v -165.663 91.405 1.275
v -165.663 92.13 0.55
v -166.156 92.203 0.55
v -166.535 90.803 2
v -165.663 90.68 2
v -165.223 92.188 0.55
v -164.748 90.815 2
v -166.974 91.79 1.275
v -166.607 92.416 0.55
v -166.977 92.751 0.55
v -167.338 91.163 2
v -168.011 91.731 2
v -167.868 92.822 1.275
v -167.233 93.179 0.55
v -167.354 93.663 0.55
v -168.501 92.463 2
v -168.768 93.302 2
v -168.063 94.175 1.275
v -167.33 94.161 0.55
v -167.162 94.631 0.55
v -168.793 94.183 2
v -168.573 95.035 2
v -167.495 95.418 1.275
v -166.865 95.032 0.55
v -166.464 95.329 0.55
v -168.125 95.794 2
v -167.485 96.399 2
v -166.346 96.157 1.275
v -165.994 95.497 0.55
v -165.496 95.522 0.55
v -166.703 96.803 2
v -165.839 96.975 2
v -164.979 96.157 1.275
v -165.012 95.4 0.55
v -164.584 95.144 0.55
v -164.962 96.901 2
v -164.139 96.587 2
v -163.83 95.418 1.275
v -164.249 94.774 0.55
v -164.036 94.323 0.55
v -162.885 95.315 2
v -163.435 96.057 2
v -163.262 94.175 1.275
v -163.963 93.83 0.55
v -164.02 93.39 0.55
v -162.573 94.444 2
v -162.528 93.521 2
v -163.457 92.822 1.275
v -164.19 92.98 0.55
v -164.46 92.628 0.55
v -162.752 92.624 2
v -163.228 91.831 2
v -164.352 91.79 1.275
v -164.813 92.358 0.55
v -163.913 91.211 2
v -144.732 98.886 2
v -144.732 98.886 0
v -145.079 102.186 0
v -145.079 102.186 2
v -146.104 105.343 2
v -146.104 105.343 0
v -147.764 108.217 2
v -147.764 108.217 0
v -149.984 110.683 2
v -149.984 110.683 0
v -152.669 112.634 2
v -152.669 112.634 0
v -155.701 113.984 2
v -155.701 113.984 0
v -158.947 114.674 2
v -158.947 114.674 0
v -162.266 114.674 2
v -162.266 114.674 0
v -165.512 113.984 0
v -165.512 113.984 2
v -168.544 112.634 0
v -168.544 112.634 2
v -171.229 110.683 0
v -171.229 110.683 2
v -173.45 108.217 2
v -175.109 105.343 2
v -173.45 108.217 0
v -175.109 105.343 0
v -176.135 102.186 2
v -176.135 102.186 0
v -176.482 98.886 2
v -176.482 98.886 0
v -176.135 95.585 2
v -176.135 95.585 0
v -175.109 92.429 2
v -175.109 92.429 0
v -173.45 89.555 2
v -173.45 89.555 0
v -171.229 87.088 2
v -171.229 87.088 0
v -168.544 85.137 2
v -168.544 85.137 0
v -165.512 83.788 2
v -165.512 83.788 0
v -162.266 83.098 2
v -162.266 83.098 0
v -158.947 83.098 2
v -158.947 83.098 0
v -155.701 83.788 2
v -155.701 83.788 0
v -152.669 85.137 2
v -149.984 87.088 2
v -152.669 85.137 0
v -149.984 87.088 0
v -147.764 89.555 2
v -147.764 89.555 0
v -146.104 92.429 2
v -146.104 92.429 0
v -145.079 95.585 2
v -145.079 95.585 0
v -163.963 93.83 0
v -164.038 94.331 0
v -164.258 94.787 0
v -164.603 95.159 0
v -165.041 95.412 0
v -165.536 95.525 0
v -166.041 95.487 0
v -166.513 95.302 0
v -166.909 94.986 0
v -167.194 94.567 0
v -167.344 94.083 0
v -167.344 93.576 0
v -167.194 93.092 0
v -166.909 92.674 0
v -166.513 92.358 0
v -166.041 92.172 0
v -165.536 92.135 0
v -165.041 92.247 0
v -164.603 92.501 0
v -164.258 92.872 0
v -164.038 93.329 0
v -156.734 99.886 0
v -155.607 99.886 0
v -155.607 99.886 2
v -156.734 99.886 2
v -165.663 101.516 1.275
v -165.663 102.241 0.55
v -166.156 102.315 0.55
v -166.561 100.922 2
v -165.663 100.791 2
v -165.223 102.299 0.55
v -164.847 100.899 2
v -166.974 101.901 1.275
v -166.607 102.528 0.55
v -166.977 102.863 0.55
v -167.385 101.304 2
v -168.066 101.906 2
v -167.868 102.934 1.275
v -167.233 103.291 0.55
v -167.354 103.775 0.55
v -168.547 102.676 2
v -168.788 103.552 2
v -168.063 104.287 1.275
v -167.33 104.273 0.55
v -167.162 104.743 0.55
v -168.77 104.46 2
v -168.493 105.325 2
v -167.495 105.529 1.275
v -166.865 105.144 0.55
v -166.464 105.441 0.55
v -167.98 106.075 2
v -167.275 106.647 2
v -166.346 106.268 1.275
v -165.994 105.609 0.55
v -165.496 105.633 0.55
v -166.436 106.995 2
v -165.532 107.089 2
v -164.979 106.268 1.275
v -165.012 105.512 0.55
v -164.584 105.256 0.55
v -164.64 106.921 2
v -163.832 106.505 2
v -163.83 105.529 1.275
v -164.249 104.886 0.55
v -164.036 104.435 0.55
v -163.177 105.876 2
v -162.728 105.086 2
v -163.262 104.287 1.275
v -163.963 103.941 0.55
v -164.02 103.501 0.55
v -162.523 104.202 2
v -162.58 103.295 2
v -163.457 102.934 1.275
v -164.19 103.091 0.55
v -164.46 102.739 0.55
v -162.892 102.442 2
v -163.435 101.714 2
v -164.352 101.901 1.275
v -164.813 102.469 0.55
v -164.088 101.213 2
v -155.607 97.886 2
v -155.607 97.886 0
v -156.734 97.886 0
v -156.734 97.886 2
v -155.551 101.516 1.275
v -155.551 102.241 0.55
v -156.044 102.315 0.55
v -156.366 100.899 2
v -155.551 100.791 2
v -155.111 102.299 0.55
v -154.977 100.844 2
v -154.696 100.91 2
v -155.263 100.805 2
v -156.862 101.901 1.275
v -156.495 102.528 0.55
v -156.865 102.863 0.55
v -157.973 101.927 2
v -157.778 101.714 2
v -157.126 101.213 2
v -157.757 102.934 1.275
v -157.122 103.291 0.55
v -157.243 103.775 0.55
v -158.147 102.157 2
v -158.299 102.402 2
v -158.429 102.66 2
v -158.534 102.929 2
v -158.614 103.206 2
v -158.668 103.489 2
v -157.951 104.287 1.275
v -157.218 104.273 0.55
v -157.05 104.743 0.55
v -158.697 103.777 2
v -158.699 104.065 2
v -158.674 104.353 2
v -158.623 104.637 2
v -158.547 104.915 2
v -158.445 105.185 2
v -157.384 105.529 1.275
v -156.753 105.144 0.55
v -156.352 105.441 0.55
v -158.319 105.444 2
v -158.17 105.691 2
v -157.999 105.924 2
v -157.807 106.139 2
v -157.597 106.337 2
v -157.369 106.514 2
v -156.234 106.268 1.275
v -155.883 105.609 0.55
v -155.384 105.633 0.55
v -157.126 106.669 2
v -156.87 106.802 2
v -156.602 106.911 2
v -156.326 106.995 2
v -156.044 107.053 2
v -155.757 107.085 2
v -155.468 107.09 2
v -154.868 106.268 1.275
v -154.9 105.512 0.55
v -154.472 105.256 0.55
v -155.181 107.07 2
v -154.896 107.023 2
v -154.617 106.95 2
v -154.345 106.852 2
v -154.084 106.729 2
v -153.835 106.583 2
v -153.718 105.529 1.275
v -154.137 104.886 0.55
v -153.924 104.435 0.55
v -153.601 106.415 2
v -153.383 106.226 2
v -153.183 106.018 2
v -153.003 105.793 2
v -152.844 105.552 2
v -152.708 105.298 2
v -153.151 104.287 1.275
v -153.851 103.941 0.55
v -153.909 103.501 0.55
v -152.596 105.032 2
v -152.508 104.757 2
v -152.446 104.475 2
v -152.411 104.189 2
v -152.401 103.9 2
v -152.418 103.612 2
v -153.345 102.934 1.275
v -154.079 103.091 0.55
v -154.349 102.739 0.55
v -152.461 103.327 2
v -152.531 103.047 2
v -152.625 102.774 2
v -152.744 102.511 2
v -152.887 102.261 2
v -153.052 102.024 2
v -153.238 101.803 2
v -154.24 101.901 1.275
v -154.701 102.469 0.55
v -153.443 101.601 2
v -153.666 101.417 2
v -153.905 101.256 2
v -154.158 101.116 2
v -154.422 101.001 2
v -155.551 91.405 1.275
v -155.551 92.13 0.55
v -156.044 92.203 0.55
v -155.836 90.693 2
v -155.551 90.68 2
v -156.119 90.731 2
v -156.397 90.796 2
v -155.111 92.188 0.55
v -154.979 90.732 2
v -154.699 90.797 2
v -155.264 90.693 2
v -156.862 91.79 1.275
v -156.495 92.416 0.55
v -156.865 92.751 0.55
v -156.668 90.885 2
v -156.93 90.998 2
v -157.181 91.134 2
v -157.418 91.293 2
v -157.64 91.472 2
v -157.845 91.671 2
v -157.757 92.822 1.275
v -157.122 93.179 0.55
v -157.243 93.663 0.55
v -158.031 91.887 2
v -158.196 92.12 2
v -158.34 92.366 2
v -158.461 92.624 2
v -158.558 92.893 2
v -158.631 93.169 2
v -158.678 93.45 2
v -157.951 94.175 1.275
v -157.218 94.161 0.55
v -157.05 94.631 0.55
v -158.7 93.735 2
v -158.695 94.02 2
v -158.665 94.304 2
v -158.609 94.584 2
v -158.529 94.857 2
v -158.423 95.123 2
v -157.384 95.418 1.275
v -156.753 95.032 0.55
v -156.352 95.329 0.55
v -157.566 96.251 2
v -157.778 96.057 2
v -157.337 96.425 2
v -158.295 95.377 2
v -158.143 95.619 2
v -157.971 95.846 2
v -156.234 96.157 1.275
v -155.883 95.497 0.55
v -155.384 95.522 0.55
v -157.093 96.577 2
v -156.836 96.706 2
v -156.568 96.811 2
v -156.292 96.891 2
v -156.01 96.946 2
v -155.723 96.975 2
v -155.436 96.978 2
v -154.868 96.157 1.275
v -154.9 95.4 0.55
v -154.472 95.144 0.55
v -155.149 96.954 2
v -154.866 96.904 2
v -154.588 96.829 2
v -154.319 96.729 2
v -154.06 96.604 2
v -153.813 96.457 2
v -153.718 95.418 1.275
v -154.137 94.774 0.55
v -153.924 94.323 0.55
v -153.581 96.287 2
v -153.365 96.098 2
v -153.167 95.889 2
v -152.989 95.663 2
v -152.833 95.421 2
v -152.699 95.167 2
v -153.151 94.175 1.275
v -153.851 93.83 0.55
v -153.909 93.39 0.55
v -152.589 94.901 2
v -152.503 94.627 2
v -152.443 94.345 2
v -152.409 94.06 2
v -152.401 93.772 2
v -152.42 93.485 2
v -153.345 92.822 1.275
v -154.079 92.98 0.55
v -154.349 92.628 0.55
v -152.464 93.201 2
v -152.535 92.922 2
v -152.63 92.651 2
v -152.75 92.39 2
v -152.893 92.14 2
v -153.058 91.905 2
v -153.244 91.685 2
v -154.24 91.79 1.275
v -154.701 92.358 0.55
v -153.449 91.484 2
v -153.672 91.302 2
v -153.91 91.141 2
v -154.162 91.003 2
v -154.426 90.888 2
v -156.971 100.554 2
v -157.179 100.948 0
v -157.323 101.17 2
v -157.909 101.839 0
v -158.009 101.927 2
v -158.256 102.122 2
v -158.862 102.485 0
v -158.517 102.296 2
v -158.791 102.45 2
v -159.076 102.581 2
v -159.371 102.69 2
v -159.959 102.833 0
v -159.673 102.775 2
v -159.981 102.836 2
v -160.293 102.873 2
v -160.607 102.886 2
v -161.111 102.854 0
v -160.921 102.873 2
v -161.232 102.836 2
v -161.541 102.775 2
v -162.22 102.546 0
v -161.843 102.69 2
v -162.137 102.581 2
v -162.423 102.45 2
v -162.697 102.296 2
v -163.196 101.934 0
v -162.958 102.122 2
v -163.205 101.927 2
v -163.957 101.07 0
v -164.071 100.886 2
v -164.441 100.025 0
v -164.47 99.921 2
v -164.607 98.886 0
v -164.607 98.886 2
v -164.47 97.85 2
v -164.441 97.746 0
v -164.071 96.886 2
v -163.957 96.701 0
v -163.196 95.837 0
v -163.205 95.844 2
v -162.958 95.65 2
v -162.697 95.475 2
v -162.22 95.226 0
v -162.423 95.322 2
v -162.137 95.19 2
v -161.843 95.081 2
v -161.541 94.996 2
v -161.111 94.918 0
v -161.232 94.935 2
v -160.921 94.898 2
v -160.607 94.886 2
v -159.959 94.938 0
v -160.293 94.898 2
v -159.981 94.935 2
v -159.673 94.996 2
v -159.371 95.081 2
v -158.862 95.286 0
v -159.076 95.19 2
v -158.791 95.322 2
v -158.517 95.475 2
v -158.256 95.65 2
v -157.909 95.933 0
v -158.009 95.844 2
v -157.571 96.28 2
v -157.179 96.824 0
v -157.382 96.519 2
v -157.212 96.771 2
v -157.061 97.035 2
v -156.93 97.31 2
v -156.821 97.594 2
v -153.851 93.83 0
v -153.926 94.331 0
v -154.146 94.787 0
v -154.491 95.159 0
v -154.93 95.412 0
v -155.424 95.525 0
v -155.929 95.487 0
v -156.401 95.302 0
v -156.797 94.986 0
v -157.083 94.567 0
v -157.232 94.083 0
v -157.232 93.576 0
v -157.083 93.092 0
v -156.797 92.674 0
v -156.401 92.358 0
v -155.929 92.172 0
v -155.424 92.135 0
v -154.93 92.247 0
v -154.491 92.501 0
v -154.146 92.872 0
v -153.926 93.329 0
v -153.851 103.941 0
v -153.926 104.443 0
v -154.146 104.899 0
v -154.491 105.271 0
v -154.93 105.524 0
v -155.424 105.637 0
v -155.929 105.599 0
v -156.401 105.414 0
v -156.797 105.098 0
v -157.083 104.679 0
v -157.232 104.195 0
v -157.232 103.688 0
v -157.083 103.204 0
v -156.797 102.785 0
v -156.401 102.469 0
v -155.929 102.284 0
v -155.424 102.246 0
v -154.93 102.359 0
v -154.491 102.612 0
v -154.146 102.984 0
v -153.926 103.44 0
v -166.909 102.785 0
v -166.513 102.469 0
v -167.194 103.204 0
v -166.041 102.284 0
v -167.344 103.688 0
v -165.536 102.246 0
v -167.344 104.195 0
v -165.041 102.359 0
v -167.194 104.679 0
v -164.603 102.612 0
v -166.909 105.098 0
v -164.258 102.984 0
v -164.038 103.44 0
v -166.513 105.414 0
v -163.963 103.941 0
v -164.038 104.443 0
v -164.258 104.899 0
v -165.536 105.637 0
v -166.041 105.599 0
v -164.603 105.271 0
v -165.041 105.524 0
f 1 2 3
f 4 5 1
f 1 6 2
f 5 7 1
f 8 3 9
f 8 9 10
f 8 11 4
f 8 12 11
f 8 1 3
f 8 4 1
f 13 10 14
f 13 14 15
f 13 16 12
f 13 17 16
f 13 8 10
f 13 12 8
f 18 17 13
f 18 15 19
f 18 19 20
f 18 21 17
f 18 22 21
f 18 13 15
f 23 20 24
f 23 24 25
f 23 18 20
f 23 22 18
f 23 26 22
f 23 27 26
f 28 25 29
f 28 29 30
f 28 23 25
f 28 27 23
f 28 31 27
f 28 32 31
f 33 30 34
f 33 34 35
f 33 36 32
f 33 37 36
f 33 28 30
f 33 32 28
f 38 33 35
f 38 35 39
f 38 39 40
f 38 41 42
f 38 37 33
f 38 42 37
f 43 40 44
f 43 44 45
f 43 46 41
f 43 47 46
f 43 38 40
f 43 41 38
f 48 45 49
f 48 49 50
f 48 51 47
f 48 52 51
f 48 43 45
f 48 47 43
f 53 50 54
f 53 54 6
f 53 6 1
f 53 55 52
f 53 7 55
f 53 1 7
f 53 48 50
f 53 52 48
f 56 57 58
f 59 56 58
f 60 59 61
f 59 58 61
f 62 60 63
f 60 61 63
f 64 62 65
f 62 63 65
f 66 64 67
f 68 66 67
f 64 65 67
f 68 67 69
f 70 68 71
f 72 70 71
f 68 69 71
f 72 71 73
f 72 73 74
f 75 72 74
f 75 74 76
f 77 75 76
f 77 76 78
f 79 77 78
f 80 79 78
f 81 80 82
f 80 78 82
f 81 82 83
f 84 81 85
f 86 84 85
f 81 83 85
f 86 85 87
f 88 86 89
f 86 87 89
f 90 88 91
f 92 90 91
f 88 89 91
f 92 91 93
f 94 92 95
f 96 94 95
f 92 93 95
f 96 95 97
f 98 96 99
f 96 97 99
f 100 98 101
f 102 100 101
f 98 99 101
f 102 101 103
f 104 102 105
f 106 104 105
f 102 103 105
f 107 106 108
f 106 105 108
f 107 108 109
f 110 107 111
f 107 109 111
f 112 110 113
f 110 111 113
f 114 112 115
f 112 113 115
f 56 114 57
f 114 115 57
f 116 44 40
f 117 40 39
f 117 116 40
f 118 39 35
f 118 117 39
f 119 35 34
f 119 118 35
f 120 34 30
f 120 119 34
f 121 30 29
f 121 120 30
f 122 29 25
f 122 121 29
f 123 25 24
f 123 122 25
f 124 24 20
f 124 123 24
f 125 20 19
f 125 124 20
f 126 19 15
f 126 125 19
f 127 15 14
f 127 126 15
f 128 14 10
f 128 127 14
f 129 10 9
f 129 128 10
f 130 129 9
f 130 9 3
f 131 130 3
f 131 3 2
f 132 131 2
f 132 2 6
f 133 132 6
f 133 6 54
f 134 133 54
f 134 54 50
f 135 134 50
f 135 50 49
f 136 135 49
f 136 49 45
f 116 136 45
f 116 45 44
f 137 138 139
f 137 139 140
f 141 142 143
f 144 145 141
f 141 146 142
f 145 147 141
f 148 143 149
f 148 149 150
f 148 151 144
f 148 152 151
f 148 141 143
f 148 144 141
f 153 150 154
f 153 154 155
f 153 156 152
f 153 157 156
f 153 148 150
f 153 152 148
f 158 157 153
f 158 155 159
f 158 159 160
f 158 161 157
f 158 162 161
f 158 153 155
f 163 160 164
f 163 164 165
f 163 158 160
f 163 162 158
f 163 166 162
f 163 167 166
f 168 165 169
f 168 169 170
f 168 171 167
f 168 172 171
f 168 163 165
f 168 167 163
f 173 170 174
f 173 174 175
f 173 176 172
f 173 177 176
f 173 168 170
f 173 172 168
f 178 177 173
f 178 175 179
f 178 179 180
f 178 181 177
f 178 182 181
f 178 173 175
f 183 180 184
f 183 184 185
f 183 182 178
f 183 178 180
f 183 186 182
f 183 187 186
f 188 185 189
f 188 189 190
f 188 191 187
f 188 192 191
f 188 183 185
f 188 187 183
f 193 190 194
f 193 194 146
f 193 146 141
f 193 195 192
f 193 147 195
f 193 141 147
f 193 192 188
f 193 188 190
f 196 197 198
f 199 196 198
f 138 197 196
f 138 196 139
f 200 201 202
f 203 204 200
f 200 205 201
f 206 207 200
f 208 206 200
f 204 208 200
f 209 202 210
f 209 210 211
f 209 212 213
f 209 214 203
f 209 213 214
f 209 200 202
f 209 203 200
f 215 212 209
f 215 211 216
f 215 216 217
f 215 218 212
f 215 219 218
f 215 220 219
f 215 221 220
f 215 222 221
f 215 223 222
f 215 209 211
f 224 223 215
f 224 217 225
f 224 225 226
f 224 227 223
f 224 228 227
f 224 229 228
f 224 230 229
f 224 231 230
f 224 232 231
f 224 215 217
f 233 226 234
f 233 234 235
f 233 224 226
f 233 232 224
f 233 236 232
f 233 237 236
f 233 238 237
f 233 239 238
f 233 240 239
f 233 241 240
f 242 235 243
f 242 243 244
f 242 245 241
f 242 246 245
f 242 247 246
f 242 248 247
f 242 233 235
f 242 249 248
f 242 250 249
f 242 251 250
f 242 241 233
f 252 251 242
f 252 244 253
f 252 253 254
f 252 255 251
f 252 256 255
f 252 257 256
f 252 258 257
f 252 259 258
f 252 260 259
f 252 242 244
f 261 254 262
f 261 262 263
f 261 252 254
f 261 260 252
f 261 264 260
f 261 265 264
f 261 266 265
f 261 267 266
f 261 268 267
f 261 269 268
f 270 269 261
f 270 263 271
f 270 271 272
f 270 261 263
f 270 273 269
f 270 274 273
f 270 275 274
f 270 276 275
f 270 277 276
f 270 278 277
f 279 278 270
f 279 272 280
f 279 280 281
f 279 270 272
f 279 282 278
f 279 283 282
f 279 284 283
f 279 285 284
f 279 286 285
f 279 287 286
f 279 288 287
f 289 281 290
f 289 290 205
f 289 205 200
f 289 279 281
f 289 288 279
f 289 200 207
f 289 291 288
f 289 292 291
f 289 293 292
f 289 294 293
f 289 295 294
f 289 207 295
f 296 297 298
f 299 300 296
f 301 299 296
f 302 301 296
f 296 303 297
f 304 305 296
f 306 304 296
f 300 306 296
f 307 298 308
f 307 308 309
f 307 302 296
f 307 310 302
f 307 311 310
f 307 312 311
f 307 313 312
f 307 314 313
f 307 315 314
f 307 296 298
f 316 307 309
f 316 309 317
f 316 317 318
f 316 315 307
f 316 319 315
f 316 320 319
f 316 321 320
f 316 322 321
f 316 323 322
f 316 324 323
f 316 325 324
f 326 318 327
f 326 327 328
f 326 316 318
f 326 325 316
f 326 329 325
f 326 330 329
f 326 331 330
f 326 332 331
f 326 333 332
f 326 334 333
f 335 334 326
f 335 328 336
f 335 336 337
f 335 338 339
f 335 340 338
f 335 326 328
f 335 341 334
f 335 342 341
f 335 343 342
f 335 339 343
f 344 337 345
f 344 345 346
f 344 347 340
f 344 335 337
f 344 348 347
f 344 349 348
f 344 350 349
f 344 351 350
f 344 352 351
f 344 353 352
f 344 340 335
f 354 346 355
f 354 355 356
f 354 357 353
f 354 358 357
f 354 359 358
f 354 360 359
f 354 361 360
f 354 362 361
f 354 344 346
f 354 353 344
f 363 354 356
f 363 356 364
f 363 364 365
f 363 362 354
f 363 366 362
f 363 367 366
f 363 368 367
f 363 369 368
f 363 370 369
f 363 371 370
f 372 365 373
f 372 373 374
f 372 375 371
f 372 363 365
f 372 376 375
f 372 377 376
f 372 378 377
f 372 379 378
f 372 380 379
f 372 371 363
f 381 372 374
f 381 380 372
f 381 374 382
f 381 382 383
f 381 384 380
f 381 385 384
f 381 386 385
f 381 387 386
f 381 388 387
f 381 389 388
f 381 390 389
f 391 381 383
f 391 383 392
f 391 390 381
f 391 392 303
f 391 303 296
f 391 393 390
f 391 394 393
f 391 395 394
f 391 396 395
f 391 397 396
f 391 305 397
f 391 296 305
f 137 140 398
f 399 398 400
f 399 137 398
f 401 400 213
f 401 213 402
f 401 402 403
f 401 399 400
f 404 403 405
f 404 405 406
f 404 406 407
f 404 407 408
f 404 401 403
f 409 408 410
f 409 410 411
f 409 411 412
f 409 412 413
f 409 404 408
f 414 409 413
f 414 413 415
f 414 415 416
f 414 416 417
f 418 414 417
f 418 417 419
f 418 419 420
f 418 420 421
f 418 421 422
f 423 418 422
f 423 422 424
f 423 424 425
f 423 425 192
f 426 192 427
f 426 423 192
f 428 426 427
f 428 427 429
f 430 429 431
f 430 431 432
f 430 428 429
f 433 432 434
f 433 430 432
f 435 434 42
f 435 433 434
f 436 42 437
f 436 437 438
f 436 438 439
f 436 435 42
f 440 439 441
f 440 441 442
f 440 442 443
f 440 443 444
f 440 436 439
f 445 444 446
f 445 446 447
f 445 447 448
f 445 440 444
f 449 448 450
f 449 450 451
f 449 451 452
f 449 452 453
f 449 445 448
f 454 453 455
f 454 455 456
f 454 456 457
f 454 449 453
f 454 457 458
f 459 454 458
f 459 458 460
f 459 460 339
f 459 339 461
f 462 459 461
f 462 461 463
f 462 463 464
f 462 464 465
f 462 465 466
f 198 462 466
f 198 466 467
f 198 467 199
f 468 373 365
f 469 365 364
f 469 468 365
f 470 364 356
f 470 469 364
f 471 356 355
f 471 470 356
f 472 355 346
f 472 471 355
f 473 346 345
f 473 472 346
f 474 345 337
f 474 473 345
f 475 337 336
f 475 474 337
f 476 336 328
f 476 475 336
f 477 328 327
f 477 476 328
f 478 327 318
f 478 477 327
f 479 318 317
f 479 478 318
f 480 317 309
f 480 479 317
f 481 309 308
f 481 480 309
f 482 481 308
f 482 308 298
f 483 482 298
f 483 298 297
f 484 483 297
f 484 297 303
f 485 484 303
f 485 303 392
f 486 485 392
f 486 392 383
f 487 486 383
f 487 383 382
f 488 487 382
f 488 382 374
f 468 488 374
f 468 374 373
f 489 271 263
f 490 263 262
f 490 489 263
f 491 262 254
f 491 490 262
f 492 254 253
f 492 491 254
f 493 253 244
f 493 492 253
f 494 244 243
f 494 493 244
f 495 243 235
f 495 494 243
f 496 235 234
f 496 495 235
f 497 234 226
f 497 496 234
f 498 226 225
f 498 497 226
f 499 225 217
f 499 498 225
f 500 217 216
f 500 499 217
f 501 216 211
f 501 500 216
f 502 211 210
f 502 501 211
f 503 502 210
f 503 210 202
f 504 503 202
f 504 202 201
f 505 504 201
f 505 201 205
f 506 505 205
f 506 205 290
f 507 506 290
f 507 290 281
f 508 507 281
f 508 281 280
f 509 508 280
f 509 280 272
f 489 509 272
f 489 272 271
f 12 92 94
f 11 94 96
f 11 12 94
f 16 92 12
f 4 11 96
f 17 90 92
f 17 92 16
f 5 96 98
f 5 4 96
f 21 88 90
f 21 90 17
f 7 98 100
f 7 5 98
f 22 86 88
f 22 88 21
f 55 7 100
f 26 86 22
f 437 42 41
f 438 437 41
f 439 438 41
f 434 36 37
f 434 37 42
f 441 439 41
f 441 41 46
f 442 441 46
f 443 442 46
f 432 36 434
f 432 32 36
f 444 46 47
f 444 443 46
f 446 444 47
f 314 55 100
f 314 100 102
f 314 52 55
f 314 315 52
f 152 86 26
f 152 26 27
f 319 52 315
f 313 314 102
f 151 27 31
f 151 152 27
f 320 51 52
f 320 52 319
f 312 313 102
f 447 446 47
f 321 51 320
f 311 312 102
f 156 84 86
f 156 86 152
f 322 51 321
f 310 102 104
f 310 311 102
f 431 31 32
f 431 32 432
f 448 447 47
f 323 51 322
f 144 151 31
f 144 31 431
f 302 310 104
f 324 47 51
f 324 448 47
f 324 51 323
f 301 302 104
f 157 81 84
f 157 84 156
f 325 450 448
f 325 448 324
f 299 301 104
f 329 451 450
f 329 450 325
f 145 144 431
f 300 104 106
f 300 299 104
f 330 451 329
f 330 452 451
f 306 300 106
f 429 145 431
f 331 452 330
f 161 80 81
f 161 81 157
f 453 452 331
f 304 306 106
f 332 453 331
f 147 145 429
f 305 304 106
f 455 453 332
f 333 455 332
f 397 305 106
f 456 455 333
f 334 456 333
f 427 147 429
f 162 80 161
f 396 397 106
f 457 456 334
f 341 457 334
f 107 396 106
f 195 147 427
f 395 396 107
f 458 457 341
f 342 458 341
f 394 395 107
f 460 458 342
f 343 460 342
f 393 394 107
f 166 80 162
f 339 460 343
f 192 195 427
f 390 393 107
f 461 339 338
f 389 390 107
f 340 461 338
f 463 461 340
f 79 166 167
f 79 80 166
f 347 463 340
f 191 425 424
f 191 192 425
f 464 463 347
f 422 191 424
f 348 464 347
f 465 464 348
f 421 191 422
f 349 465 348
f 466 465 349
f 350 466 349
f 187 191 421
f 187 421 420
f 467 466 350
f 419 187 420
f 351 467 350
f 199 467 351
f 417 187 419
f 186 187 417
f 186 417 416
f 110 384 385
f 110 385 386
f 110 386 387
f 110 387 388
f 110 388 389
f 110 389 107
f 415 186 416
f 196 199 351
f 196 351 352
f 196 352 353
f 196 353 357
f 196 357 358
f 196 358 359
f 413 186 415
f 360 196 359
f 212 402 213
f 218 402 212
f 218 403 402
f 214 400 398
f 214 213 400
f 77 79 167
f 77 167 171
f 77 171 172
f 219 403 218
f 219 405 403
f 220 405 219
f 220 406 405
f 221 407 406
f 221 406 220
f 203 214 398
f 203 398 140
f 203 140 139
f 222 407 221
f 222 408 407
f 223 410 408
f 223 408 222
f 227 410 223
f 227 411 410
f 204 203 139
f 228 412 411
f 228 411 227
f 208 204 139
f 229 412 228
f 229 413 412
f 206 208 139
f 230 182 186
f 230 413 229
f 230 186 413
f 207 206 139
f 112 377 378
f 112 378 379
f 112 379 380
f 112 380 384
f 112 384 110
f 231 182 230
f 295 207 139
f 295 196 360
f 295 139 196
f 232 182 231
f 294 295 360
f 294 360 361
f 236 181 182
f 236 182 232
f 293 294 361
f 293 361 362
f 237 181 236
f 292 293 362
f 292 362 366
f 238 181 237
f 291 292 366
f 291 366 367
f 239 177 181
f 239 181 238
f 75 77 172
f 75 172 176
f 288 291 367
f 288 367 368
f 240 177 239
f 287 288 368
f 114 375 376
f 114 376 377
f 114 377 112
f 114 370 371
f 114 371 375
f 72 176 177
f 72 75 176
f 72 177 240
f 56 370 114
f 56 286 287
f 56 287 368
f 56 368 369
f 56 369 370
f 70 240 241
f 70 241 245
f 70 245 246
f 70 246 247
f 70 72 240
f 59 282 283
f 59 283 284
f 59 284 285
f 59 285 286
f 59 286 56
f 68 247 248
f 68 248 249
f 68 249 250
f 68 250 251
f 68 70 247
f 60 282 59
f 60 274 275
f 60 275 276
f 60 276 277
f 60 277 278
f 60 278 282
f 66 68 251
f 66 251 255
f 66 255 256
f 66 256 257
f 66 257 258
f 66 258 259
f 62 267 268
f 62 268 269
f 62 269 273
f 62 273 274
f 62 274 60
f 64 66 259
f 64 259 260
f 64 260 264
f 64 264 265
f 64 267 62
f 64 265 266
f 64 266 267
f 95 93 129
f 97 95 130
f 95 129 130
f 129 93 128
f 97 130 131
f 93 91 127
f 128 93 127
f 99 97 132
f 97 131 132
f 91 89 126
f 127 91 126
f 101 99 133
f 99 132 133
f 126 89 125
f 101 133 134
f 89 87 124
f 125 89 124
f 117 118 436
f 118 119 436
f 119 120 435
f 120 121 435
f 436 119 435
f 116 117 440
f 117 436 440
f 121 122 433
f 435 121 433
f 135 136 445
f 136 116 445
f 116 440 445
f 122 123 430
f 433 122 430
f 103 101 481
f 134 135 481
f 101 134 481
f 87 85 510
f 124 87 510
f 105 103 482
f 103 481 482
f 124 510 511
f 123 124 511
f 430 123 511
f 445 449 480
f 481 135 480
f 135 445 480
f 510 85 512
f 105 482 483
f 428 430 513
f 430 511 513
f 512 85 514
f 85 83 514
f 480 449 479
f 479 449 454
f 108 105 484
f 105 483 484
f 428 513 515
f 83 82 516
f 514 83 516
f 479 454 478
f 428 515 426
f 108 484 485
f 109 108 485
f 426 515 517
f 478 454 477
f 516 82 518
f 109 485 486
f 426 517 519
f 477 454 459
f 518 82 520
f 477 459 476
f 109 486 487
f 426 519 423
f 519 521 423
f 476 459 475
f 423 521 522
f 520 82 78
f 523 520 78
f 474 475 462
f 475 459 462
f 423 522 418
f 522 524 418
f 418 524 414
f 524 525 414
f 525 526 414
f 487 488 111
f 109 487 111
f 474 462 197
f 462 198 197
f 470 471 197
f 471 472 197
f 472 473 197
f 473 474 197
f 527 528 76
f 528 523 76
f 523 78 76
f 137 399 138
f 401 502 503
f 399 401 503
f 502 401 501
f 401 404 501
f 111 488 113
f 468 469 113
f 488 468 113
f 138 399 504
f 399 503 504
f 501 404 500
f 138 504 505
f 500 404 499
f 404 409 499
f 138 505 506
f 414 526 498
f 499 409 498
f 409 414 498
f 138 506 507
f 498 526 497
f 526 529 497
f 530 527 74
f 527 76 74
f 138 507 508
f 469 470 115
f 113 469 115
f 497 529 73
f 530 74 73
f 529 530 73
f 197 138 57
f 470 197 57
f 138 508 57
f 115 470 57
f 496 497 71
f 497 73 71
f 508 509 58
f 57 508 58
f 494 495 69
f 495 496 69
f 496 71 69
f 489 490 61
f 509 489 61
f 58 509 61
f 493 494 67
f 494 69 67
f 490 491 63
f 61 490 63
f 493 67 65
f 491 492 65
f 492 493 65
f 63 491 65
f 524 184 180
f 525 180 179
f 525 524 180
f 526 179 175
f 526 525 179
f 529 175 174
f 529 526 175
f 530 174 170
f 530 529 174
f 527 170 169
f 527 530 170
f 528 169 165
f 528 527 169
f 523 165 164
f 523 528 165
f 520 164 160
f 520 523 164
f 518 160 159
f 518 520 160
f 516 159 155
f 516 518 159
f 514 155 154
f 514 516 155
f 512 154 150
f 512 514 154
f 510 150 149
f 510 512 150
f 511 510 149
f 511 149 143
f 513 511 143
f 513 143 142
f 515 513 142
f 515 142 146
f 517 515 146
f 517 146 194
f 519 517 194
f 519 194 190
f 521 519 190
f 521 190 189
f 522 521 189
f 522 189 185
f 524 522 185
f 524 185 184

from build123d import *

# Parameters (mm, degrees)
SKETCH2_R                                      = 15.875
SKETCH2_R_2                                    = 1.7
SKETCH2_R_3                                    = 4
BOSS_EXTRUDE1_DEPTH                            = 2
CSK_FOR_M3_FLAT_HEAD_MACHINE_SCREW2_AT_2_COUNT = 2
CSK_FOR_M3_FLAT_HEAD_MACHINE_SCREW2_AT_2_PITCH = 10.111626971
CSK_FOR_M3_FLAT_HEAD_MACHINE_SCREW2_AT_3_COUNT = 2
CSK_FOR_M3_FLAT_HEAD_MACHINE_SCREW2_AT_3_PITCH = 14.3
CSK_FOR_M3_FLAT_HEAD_MACHINE_SCREW2_AT_4_COUNT = 2
CSK_FOR_M3_FLAT_HEAD_MACHINE_SCREW2_AT_4_PITCH = 10.111626971
SKETCH5_W                                      = 1.314472485
SKETCH5_H                                      = 2
CUT_EXTRUDE1_DEPTH                             = 3


with BuildPart() as part:
    # Sketch2 → Boss-Extrude1 (new body)
    with BuildSketch(Plane.XY):
        with Locations((-160.606756626, 98.885631483)):
            Circle(SKETCH2_R)
        with Locations((-165.662570112, 103.941444968)):
            Circle(SKETCH2_R_2, mode=Mode.SUBTRACT)
        with Locations((-155.550943141, 103.941444968)):
            Circle(SKETCH2_R_2, mode=Mode.SUBTRACT)
        with Locations((-155.550943141, 93.829817997)):
            Circle(SKETCH2_R_2, mode=Mode.SUBTRACT)
        with Locations((-165.662570112, 93.829817997)):
            Circle(SKETCH2_R_2, mode=Mode.SUBTRACT)
        with Locations((-160.606756626, 98.885631483)):
            Circle(SKETCH2_R_3, mode=Mode.SUBTRACT)
    extrude(amount=BOSS_EXTRUDE1_DEPTH)

    # Sketch4 → CSK for M3 Flat Head Machine Screw2 (revolve, cut)
    with BuildSketch(Plane(origin=(-165.662570112, 103.941444968, 2), x_dir=(0, -1, 0), z_dir=(1, 0, 0))):
        Polygon((0, 0), (0, 2), (1.7, 2), (1.7, 1.45), (3.15, 0), align=None)
    csk_for_m3_flat_head_machine_screw2 = revolve(axis=Axis((-165.662570112, 103.941444968, 8.35), (0, 0, -1)), mode=Mode.SUBTRACT)

    # CSK for M3 Flat Head Machine Screw2 at 2: CSK for M3 Flat Head Machine Screw2 ×2
    with Locations(*[(i * CSK_FOR_M3_FLAT_HEAD_MACHINE_SCREW2_AT_2_PITCH, 0, 0) for i in range(1, CSK_FOR_M3_FLAT_HEAD_MACHINE_SCREW2_AT_2_COUNT)]):
        add(csk_for_m3_flat_head_machine_screw2, mode=Mode.SUBTRACT)

    # CSK for M3 Flat Head Machine Screw2 at 3: CSK for M3 Flat Head Machine Screw2 ×2
    with Locations(*[Vector(0.707106781, -0.707106781, 0) * (i * CSK_FOR_M3_FLAT_HEAD_MACHINE_SCREW2_AT_3_PITCH) for i in range(1, CSK_FOR_M3_FLAT_HEAD_MACHINE_SCREW2_AT_3_COUNT)]):
        add(csk_for_m3_flat_head_machine_screw2, mode=Mode.SUBTRACT)

    # CSK for M3 Flat Head Machine Screw2 at 4: CSK for M3 Flat Head Machine Screw2 ×2
    with Locations(*[(0, -i * CSK_FOR_M3_FLAT_HEAD_MACHINE_SCREW2_AT_4_PITCH, 0) for i in range(1, CSK_FOR_M3_FLAT_HEAD_MACHINE_SCREW2_AT_4_COUNT)]):
        add(csk_for_m3_flat_head_machine_screw2, mode=Mode.SUBTRACT)

    # Sketch5 → Cut-Extrude1 (cut, through all)
    with BuildSketch(Plane(origin=(0, 0, 0), x_dir=(-1, 0, 0), z_dir=(0, 0, -1))):
        with Locations((156.263992868, 98.885631483)):
            Rectangle(SKETCH5_W, SKETCH5_H)
    extrude(amount=-CUT_EXTRUDE1_DEPTH, mode=Mode.SUBTRACT)


solid = part.part
